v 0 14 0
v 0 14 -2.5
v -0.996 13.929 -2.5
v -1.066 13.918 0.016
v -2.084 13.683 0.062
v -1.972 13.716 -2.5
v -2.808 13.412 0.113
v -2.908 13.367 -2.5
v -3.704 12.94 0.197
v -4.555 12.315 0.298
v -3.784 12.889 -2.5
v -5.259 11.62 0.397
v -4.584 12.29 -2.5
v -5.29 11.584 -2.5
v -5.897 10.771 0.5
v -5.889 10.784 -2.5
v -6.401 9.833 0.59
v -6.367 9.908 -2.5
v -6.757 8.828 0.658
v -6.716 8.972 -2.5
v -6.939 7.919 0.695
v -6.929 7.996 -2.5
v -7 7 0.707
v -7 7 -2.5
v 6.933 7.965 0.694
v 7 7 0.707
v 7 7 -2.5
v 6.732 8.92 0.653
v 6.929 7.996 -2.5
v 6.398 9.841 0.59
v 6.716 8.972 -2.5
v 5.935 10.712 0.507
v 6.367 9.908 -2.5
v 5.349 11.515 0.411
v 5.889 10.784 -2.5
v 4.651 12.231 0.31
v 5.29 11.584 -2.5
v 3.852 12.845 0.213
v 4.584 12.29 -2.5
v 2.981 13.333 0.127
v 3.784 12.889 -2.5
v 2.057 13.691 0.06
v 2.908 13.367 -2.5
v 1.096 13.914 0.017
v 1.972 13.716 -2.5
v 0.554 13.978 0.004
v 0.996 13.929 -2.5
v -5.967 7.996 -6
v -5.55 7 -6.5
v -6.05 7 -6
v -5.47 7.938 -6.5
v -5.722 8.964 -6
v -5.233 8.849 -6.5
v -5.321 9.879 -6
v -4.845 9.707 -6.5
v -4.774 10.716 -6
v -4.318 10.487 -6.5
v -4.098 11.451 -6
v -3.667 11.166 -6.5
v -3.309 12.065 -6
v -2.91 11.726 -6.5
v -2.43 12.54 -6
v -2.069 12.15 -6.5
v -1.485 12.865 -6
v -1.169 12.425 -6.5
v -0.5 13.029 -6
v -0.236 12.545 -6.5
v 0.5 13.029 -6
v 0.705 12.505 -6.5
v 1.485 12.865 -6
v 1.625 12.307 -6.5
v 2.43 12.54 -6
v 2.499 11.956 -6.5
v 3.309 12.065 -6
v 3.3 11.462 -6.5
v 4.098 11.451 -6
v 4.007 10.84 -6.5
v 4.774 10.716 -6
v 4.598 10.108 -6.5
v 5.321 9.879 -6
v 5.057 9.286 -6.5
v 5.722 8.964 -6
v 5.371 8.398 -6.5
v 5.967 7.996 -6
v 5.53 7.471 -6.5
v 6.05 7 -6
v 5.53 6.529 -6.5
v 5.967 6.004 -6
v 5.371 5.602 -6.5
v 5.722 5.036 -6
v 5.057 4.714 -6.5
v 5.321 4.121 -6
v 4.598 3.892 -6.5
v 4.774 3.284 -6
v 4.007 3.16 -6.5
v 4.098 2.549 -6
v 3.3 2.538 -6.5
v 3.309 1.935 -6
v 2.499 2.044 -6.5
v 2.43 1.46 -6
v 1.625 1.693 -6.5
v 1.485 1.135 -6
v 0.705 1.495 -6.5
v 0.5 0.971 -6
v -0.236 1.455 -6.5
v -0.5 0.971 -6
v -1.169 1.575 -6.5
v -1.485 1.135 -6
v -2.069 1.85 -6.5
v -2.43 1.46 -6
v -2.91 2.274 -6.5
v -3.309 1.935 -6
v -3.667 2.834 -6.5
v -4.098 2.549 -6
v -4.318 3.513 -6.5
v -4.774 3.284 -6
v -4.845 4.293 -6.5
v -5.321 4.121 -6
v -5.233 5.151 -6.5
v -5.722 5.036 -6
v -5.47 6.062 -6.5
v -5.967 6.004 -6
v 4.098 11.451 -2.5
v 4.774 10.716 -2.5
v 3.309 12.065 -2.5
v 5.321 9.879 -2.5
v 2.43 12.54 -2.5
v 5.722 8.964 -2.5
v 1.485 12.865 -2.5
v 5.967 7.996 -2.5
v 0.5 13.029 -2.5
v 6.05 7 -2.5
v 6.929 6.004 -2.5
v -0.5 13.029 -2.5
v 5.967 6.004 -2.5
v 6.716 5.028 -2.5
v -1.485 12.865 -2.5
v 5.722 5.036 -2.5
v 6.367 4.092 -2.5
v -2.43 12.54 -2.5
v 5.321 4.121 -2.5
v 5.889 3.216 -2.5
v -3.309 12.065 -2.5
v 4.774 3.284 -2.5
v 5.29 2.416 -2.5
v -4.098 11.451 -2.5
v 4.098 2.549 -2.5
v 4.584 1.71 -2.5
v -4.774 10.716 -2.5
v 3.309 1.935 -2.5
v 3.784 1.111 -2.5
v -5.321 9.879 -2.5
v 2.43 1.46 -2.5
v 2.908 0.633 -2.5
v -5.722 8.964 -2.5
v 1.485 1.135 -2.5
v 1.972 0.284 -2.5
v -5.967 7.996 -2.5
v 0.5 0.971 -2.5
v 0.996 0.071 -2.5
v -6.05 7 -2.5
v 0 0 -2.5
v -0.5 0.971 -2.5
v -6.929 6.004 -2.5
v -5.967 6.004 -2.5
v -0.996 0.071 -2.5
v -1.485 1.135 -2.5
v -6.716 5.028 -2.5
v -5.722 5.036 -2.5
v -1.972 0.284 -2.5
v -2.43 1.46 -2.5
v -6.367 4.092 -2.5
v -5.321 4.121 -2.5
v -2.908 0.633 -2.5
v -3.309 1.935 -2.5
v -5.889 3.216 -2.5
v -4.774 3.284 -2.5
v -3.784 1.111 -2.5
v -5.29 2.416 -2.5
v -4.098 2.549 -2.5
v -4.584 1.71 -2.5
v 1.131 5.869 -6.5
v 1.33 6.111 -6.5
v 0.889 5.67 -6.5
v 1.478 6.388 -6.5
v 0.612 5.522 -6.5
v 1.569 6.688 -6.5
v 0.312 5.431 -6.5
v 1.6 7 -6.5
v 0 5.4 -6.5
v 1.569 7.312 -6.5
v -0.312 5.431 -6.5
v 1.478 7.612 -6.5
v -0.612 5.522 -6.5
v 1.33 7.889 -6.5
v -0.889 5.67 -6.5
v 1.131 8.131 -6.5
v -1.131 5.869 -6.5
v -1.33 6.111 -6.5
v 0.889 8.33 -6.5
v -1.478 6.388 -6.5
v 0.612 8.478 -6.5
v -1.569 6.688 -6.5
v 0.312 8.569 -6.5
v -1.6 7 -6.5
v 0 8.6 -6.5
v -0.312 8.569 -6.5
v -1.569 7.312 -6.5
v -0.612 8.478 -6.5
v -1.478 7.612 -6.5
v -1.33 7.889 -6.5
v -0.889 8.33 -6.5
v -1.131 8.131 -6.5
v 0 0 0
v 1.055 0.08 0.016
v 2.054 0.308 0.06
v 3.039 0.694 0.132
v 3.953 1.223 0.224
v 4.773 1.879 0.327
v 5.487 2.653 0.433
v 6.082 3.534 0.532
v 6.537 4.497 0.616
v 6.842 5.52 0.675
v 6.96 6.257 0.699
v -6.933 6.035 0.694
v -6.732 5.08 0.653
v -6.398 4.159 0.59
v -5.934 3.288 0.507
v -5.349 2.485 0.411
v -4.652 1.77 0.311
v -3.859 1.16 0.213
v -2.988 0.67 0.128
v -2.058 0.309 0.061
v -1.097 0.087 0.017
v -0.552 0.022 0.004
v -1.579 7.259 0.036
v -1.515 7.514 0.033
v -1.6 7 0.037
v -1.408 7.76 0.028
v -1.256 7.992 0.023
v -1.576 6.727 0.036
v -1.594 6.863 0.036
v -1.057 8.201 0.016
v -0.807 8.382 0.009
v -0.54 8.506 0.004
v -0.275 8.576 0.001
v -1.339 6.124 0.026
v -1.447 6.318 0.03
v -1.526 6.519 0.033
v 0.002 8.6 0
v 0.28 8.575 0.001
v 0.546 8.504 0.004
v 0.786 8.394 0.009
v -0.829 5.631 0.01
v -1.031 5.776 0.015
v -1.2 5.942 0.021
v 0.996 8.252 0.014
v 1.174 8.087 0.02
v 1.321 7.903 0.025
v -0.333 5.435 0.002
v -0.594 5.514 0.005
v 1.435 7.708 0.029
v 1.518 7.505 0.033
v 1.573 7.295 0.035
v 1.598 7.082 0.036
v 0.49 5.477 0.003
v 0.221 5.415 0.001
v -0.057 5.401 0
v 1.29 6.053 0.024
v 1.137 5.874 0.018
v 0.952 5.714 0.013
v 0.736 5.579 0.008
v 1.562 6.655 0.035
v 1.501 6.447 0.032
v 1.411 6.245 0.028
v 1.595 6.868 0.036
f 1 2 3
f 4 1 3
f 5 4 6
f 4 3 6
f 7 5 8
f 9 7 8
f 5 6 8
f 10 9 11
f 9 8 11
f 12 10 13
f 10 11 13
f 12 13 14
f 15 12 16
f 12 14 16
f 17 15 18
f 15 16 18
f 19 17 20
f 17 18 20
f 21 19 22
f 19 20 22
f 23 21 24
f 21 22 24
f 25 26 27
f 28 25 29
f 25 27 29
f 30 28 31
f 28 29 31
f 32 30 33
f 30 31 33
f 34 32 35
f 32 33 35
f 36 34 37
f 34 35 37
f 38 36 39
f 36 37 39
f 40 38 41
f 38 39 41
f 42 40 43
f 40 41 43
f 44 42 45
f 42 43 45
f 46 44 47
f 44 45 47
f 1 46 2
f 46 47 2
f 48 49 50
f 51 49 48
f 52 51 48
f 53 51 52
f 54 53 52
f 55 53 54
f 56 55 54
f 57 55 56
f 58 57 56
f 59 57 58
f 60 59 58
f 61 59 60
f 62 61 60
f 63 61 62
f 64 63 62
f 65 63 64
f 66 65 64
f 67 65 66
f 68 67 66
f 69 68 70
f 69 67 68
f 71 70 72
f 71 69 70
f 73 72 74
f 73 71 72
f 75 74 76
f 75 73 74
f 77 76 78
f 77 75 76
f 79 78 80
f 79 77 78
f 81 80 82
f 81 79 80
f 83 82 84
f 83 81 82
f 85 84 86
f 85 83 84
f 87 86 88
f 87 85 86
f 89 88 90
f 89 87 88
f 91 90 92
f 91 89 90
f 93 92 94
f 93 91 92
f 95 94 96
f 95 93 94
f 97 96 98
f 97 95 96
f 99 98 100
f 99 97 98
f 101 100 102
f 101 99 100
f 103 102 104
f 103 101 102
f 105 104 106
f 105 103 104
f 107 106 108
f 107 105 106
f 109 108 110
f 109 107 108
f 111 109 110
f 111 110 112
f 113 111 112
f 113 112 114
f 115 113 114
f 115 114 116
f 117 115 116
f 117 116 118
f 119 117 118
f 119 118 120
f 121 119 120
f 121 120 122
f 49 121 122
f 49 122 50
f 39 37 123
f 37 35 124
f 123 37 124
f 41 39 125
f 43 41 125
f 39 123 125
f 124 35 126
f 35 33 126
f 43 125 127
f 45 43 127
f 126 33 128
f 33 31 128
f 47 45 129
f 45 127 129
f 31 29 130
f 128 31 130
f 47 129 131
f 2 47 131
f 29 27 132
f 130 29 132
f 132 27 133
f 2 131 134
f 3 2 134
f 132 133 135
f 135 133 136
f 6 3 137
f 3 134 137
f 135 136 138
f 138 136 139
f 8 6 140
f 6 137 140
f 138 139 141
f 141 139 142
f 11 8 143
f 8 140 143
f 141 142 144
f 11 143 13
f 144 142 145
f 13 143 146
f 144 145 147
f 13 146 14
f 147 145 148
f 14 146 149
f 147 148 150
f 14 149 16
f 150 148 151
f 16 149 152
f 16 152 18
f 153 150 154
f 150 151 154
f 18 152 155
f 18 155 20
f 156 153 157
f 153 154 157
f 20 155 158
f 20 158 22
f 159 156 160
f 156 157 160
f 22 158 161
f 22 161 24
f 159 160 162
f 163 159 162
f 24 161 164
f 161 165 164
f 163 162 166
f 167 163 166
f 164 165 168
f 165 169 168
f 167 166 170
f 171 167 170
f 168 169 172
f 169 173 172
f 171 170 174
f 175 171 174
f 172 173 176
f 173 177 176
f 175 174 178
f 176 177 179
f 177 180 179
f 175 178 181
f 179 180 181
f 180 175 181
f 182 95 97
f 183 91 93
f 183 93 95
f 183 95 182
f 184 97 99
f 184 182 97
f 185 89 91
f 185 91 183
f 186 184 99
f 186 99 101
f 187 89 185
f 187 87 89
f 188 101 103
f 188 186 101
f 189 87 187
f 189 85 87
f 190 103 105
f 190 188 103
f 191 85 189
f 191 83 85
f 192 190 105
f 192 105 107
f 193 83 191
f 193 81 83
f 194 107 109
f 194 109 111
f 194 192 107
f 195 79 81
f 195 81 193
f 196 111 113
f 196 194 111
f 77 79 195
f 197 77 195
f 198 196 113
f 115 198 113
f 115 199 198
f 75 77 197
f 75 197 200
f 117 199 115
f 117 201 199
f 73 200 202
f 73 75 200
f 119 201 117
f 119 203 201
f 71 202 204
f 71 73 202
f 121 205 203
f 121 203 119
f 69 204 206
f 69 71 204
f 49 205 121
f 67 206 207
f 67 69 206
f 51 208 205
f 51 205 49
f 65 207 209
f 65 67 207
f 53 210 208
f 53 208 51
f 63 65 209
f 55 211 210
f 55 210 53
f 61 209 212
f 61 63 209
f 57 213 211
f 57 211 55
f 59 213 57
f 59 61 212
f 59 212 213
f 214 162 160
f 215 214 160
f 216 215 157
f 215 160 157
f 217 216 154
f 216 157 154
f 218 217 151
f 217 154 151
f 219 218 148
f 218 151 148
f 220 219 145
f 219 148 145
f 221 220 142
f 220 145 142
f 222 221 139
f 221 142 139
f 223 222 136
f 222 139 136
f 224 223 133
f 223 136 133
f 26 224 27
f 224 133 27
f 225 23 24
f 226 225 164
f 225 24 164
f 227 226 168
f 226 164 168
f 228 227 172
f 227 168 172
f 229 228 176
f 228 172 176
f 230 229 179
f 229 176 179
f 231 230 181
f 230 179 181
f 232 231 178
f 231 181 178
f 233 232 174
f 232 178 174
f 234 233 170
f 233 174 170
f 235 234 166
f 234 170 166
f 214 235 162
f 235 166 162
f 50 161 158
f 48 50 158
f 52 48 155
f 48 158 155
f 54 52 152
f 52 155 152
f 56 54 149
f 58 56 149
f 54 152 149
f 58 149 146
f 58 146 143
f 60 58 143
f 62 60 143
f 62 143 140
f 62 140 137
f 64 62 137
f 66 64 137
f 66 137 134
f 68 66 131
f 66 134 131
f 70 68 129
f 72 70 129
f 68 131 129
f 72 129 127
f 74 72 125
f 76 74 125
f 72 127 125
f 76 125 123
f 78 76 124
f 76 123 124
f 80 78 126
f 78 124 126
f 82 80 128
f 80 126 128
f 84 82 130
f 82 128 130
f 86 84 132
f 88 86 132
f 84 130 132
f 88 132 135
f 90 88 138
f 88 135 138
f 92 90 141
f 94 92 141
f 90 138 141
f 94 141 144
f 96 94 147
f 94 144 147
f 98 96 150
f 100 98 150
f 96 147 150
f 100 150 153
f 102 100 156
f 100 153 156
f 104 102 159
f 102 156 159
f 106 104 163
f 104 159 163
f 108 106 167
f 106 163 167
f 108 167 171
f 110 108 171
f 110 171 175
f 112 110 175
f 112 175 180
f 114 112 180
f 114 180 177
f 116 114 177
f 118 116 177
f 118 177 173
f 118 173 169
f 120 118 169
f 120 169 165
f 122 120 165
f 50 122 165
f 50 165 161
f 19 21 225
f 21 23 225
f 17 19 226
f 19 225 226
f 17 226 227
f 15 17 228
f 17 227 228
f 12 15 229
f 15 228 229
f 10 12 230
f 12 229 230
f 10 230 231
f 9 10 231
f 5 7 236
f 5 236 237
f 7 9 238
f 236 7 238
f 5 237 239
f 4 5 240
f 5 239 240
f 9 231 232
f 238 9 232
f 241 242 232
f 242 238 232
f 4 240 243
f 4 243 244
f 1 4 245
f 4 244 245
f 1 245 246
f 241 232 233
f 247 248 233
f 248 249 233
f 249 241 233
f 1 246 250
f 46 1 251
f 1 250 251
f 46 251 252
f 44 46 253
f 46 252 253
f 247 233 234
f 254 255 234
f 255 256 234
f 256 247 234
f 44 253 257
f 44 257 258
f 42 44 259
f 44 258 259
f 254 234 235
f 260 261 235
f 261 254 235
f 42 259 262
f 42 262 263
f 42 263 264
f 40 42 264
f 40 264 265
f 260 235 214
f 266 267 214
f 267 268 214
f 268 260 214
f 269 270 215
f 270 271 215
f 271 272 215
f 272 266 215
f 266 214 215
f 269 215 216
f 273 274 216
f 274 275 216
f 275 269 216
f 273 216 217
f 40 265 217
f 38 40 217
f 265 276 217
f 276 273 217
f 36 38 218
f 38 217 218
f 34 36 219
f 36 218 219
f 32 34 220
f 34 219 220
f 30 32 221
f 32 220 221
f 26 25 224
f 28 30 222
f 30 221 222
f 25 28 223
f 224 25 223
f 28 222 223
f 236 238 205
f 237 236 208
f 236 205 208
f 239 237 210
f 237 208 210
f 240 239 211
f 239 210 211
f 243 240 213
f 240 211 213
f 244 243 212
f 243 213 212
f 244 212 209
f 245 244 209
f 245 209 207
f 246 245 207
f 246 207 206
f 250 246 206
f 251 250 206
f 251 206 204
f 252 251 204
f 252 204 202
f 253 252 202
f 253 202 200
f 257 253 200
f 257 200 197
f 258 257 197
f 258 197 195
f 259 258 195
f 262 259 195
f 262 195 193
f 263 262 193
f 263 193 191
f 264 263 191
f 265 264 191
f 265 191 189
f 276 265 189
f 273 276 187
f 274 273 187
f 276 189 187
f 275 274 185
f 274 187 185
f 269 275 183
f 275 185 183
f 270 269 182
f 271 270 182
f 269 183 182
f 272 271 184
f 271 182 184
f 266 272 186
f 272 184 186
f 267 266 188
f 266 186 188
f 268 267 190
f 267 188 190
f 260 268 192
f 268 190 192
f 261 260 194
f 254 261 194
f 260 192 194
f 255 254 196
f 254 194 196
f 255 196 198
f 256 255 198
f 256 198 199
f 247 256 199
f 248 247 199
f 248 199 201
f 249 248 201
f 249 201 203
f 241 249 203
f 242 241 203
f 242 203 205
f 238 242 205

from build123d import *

# Parameters (mm, degrees)
EXTRUDE_1_DEPTH     = 14
CUT_EXTRUDE_3_DEPTH = 14
SKETCH_3_R          = 6.05
EXTRUDE_2_DEPTH     = 4
CHAMFER_1_SIZE      = 0.5
SKETCH_4_R          = 1.6
CUT_EXTRUDE_4_DEPTH = 8.207143701


with BuildPart() as part:
    # Эскиз1 → Бобышка-Вытянуть1 (new body)
    with BuildSketch(Plane(origin=(0, 0, 0), x_dir=(1, 0, 0), z_dir=(0, 1, 0))):
        with BuildLine():
            Line((7, 2.5), (-7, 2.5))
            Line((-7, 2.5), (-7, -0.707143601))
            ThreePointArc((-7, -0.707143601), (0, 0), (7, -0.707143601))
            Line((7, -0.707143601), (7, 2.5))
        make_face()
    extrude(amount=EXTRUDE_1_DEPTH)

    # Эскиз2 → Вырез-Вытянуть3 (cut)
    with BuildSketch(Plane(origin=(0, 0, -2.5), x_dir=(-1, 0, 0), z_dir=(0, 0, -1))):
        with BuildLine():
            ThreePointArc((0, 0), (-4.949747468, 2.050252532), (-7, 7))
            Line((-7, 7), (-7, 0))
            Line((-7, 0), (0, 0))
        make_face()
        with BuildLine():
            Line((0, 14), (-7, 14))
            Line((-7, 14), (-7, 7))
            ThreePointArc((-7, 7), (-4.949747468, 11.949747468), (0, 14))
        make_face()
        with BuildLine():
            Line((7, 14), (0, 14))
            ThreePointArc((0, 14), (4.949747468, 11.949747468), (7, 7))
            Line((7, 7), (7, 14))
        make_face()
        with BuildLine():
            Line((7, 0), (7, 7))
            ThreePointArc((7, 7), (4.949747468, 2.050252532), (0, 0))
            Line((0, 0), (7, 0))
        make_face()
    extrude(amount=-CUT_EXTRUDE_3_DEPTH, mode=Mode.SUBTRACT)

    # Эскиз3 → Бобышка-Вытянуть2 (add)
    with BuildSketch(Plane(origin=(0, 0, -2.5), x_dir=(-1, 0, 0), z_dir=(0, 0, -1))):
        with Locations((0, 7)):
            Circle(SKETCH_3_R)
    extrude(amount=EXTRUDE_2_DEPTH)

    # Фаска1
    chamfer_1_edges = [part.edges().sort_by_distance(p)[0] for p in [
        (6.05, 7, -6.5),
    ]]
    chamfer(chamfer_1_edges, length=CHAMFER_1_SIZE)

    # Эскиз4 → Вырез-Вытянуть4 (cut, through all)
    with BuildSketch(Plane(origin=(0, 0, -6.5), x_dir=(-1, 0, 0), z_dir=(0, 0, -1))):
        with Locations((0, 7)):
            Circle(SKETCH_4_R)
    extrude(amount=-CUT_EXTRUDE_4_DEPTH, mode=Mode.SUBTRACT)


solid = part.part
